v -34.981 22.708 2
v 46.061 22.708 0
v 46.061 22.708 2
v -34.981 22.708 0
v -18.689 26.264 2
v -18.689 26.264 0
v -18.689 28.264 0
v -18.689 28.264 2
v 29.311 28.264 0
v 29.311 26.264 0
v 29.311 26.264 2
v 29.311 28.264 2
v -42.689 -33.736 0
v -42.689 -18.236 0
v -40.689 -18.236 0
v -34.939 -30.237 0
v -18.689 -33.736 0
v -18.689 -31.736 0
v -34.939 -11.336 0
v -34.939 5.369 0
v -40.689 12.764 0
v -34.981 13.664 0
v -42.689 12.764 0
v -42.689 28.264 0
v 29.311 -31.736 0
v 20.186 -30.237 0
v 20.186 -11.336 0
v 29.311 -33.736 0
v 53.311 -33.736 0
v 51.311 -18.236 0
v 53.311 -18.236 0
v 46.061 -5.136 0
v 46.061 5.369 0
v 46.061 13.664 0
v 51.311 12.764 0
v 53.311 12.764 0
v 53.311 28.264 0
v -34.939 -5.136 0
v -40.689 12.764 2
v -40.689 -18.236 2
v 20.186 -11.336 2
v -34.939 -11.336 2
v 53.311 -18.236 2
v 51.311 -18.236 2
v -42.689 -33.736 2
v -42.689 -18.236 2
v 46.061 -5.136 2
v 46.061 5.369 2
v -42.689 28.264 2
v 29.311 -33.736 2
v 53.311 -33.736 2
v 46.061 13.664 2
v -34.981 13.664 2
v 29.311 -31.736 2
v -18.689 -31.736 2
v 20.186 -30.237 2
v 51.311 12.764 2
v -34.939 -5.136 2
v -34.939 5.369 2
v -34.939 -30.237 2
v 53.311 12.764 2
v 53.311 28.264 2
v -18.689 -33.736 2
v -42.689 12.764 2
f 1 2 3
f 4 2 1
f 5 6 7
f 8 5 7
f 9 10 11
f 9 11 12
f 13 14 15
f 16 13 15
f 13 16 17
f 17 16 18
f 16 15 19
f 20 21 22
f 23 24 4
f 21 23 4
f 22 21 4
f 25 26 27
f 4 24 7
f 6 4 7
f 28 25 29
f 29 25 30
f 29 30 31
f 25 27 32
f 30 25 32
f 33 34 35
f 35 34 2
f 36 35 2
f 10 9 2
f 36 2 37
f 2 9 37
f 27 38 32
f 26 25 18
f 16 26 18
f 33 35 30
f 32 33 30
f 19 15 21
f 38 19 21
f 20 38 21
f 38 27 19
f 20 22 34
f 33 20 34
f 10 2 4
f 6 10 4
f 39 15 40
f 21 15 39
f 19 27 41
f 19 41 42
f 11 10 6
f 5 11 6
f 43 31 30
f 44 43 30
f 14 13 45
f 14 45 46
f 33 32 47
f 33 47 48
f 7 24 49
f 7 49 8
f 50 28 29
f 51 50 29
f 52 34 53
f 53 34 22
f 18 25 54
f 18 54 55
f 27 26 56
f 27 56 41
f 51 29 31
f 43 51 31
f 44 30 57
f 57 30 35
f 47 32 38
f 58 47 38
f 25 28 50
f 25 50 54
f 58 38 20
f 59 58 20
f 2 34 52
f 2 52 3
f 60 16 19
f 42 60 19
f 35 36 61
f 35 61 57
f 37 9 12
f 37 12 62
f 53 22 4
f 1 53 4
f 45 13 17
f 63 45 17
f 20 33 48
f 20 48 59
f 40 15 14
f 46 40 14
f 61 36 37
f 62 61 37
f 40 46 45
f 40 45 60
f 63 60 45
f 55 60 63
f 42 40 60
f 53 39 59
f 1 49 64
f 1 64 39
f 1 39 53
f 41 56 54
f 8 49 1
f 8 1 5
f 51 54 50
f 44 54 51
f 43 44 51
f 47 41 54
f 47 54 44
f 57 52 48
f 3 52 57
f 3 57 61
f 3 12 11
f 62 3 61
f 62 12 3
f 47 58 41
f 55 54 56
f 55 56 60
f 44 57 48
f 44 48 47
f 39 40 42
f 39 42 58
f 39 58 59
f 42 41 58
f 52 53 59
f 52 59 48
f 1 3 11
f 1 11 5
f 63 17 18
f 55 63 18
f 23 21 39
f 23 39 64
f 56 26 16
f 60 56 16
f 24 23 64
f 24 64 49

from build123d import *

# Parameters (mm, degrees)
SKETCH_1_W          = 96
SKETCH_1_H          = 62
EXTRUDE_1_DEPTH     = 2
SKETCH_2_W          = 55.125
SKETCH_2_H          = 18.9014
SKETCH_2_W_2        = 81
SKETCH_2_H_2        = 10.505077979
SKETCH_2_W_3        = 81.042070701
SKETCH_2_H_3        = 9.043475151
CUT_EXTRUDE_1_DEPTH = 2
SKETCH_3_W          = 48
SKETCH_3_H          = 2
CUT_EXTRUDE_2_DEPTH = 3
SKETCH_4_W          = 48
SKETCH_4_H          = 2
CUT_EXTRUDE_3_DEPTH = 3
SKETCH_5_W          = 2
SKETCH_5_H          = 31
CUT_EXTRUDE_4_DEPTH = 3
SKETCH_6_W          = 2
SKETCH_6_H          = 31
CUT_EXTRUDE_5_DEPTH = 3


with BuildPart() as part:
    # ｽｹｯﾁ1 → ﾎﾞｽ - 押し出し1 (new body)
    with BuildSketch(Plane.XY):
        with Locations((5.311186132, -2.735849057)):
            Rectangle(SKETCH_1_W, SKETCH_1_H)
    extrude(amount=EXTRUDE_1_DEPTH)

    # ｽｹｯﾁ2 → ｶｯﾄ - 押し出し1 (cut)
    with BuildSketch(Plane(origin=(0, 0, 0), x_dir=(-1, 0, 0), z_dir=(0, 0, -1))):
        with Locations((7.376313868, -20.786549057)):
            Rectangle(SKETCH_2_W, SKETCH_2_H)
        with Locations((-5.561186132, 0.116689932)):
            Rectangle(SKETCH_2_W_2, SKETCH_2_H_2)
        with Locations((-5.540150781, 18.185888519)):
            Rectangle(SKETCH_2_W_3, SKETCH_2_H_3)
    extrude(amount=-CUT_EXTRUDE_1_DEPTH, mode=Mode.SUBTRACT)

    # ｽｹｯﾁ3 → ｶｯﾄ - 押し出し2 (cut, through all)
    with BuildSketch(Plane(origin=(0, 0, 0), x_dir=(-1, 0, 0), z_dir=(0, 0, -1))):
        with Locations((-5.311186132, -32.735849057)):
            Rectangle(SKETCH_3_W, SKETCH_3_H)
    extrude(amount=-CUT_EXTRUDE_2_DEPTH, mode=Mode.SUBTRACT)

    # ｽｹｯﾁ4 → ｶｯﾄ - 押し出し3 (cut, through all)
    with BuildSketch(Plane(origin=(0, 0, 0), x_dir=(-1, 0, 0), z_dir=(0, 0, -1))):
        with Locations((-5.311186132, 27.264150943)):
            Rectangle(SKETCH_4_W, SKETCH_4_H)
    extrude(amount=-CUT_EXTRUDE_3_DEPTH, mode=Mode.SUBTRACT)

    # ｽｹｯﾁ5 → ｶｯﾄ - 押し出し4 (cut, through all)
    with BuildSketch(Plane(origin=(0, 0, 0), x_dir=(-1, 0, 0), z_dir=(0, 0, -1))):
        with Locations((41.688813868, -2.735849057)):
            Rectangle(SKETCH_5_W, SKETCH_5_H)
    extrude(amount=-CUT_EXTRUDE_4_DEPTH, mode=Mode.SUBTRACT)

    # ｽｹｯﾁ6 → ｶｯﾄ - 押し出し5 (cut, through all)
    with BuildSketch(Plane(origin=(0, 0, 0), x_dir=(-1, 0, 0), z_dir=(0, 0, -1))):
        with Locations((-52.311186132, -2.735849057)):
            Rectangle(SKETCH_6_W, SKETCH_6_H)
    extrude(amount=-CUT_EXTRUDE_5_DEPTH, mode=Mode.SUBTRACT)


solid = part.part
